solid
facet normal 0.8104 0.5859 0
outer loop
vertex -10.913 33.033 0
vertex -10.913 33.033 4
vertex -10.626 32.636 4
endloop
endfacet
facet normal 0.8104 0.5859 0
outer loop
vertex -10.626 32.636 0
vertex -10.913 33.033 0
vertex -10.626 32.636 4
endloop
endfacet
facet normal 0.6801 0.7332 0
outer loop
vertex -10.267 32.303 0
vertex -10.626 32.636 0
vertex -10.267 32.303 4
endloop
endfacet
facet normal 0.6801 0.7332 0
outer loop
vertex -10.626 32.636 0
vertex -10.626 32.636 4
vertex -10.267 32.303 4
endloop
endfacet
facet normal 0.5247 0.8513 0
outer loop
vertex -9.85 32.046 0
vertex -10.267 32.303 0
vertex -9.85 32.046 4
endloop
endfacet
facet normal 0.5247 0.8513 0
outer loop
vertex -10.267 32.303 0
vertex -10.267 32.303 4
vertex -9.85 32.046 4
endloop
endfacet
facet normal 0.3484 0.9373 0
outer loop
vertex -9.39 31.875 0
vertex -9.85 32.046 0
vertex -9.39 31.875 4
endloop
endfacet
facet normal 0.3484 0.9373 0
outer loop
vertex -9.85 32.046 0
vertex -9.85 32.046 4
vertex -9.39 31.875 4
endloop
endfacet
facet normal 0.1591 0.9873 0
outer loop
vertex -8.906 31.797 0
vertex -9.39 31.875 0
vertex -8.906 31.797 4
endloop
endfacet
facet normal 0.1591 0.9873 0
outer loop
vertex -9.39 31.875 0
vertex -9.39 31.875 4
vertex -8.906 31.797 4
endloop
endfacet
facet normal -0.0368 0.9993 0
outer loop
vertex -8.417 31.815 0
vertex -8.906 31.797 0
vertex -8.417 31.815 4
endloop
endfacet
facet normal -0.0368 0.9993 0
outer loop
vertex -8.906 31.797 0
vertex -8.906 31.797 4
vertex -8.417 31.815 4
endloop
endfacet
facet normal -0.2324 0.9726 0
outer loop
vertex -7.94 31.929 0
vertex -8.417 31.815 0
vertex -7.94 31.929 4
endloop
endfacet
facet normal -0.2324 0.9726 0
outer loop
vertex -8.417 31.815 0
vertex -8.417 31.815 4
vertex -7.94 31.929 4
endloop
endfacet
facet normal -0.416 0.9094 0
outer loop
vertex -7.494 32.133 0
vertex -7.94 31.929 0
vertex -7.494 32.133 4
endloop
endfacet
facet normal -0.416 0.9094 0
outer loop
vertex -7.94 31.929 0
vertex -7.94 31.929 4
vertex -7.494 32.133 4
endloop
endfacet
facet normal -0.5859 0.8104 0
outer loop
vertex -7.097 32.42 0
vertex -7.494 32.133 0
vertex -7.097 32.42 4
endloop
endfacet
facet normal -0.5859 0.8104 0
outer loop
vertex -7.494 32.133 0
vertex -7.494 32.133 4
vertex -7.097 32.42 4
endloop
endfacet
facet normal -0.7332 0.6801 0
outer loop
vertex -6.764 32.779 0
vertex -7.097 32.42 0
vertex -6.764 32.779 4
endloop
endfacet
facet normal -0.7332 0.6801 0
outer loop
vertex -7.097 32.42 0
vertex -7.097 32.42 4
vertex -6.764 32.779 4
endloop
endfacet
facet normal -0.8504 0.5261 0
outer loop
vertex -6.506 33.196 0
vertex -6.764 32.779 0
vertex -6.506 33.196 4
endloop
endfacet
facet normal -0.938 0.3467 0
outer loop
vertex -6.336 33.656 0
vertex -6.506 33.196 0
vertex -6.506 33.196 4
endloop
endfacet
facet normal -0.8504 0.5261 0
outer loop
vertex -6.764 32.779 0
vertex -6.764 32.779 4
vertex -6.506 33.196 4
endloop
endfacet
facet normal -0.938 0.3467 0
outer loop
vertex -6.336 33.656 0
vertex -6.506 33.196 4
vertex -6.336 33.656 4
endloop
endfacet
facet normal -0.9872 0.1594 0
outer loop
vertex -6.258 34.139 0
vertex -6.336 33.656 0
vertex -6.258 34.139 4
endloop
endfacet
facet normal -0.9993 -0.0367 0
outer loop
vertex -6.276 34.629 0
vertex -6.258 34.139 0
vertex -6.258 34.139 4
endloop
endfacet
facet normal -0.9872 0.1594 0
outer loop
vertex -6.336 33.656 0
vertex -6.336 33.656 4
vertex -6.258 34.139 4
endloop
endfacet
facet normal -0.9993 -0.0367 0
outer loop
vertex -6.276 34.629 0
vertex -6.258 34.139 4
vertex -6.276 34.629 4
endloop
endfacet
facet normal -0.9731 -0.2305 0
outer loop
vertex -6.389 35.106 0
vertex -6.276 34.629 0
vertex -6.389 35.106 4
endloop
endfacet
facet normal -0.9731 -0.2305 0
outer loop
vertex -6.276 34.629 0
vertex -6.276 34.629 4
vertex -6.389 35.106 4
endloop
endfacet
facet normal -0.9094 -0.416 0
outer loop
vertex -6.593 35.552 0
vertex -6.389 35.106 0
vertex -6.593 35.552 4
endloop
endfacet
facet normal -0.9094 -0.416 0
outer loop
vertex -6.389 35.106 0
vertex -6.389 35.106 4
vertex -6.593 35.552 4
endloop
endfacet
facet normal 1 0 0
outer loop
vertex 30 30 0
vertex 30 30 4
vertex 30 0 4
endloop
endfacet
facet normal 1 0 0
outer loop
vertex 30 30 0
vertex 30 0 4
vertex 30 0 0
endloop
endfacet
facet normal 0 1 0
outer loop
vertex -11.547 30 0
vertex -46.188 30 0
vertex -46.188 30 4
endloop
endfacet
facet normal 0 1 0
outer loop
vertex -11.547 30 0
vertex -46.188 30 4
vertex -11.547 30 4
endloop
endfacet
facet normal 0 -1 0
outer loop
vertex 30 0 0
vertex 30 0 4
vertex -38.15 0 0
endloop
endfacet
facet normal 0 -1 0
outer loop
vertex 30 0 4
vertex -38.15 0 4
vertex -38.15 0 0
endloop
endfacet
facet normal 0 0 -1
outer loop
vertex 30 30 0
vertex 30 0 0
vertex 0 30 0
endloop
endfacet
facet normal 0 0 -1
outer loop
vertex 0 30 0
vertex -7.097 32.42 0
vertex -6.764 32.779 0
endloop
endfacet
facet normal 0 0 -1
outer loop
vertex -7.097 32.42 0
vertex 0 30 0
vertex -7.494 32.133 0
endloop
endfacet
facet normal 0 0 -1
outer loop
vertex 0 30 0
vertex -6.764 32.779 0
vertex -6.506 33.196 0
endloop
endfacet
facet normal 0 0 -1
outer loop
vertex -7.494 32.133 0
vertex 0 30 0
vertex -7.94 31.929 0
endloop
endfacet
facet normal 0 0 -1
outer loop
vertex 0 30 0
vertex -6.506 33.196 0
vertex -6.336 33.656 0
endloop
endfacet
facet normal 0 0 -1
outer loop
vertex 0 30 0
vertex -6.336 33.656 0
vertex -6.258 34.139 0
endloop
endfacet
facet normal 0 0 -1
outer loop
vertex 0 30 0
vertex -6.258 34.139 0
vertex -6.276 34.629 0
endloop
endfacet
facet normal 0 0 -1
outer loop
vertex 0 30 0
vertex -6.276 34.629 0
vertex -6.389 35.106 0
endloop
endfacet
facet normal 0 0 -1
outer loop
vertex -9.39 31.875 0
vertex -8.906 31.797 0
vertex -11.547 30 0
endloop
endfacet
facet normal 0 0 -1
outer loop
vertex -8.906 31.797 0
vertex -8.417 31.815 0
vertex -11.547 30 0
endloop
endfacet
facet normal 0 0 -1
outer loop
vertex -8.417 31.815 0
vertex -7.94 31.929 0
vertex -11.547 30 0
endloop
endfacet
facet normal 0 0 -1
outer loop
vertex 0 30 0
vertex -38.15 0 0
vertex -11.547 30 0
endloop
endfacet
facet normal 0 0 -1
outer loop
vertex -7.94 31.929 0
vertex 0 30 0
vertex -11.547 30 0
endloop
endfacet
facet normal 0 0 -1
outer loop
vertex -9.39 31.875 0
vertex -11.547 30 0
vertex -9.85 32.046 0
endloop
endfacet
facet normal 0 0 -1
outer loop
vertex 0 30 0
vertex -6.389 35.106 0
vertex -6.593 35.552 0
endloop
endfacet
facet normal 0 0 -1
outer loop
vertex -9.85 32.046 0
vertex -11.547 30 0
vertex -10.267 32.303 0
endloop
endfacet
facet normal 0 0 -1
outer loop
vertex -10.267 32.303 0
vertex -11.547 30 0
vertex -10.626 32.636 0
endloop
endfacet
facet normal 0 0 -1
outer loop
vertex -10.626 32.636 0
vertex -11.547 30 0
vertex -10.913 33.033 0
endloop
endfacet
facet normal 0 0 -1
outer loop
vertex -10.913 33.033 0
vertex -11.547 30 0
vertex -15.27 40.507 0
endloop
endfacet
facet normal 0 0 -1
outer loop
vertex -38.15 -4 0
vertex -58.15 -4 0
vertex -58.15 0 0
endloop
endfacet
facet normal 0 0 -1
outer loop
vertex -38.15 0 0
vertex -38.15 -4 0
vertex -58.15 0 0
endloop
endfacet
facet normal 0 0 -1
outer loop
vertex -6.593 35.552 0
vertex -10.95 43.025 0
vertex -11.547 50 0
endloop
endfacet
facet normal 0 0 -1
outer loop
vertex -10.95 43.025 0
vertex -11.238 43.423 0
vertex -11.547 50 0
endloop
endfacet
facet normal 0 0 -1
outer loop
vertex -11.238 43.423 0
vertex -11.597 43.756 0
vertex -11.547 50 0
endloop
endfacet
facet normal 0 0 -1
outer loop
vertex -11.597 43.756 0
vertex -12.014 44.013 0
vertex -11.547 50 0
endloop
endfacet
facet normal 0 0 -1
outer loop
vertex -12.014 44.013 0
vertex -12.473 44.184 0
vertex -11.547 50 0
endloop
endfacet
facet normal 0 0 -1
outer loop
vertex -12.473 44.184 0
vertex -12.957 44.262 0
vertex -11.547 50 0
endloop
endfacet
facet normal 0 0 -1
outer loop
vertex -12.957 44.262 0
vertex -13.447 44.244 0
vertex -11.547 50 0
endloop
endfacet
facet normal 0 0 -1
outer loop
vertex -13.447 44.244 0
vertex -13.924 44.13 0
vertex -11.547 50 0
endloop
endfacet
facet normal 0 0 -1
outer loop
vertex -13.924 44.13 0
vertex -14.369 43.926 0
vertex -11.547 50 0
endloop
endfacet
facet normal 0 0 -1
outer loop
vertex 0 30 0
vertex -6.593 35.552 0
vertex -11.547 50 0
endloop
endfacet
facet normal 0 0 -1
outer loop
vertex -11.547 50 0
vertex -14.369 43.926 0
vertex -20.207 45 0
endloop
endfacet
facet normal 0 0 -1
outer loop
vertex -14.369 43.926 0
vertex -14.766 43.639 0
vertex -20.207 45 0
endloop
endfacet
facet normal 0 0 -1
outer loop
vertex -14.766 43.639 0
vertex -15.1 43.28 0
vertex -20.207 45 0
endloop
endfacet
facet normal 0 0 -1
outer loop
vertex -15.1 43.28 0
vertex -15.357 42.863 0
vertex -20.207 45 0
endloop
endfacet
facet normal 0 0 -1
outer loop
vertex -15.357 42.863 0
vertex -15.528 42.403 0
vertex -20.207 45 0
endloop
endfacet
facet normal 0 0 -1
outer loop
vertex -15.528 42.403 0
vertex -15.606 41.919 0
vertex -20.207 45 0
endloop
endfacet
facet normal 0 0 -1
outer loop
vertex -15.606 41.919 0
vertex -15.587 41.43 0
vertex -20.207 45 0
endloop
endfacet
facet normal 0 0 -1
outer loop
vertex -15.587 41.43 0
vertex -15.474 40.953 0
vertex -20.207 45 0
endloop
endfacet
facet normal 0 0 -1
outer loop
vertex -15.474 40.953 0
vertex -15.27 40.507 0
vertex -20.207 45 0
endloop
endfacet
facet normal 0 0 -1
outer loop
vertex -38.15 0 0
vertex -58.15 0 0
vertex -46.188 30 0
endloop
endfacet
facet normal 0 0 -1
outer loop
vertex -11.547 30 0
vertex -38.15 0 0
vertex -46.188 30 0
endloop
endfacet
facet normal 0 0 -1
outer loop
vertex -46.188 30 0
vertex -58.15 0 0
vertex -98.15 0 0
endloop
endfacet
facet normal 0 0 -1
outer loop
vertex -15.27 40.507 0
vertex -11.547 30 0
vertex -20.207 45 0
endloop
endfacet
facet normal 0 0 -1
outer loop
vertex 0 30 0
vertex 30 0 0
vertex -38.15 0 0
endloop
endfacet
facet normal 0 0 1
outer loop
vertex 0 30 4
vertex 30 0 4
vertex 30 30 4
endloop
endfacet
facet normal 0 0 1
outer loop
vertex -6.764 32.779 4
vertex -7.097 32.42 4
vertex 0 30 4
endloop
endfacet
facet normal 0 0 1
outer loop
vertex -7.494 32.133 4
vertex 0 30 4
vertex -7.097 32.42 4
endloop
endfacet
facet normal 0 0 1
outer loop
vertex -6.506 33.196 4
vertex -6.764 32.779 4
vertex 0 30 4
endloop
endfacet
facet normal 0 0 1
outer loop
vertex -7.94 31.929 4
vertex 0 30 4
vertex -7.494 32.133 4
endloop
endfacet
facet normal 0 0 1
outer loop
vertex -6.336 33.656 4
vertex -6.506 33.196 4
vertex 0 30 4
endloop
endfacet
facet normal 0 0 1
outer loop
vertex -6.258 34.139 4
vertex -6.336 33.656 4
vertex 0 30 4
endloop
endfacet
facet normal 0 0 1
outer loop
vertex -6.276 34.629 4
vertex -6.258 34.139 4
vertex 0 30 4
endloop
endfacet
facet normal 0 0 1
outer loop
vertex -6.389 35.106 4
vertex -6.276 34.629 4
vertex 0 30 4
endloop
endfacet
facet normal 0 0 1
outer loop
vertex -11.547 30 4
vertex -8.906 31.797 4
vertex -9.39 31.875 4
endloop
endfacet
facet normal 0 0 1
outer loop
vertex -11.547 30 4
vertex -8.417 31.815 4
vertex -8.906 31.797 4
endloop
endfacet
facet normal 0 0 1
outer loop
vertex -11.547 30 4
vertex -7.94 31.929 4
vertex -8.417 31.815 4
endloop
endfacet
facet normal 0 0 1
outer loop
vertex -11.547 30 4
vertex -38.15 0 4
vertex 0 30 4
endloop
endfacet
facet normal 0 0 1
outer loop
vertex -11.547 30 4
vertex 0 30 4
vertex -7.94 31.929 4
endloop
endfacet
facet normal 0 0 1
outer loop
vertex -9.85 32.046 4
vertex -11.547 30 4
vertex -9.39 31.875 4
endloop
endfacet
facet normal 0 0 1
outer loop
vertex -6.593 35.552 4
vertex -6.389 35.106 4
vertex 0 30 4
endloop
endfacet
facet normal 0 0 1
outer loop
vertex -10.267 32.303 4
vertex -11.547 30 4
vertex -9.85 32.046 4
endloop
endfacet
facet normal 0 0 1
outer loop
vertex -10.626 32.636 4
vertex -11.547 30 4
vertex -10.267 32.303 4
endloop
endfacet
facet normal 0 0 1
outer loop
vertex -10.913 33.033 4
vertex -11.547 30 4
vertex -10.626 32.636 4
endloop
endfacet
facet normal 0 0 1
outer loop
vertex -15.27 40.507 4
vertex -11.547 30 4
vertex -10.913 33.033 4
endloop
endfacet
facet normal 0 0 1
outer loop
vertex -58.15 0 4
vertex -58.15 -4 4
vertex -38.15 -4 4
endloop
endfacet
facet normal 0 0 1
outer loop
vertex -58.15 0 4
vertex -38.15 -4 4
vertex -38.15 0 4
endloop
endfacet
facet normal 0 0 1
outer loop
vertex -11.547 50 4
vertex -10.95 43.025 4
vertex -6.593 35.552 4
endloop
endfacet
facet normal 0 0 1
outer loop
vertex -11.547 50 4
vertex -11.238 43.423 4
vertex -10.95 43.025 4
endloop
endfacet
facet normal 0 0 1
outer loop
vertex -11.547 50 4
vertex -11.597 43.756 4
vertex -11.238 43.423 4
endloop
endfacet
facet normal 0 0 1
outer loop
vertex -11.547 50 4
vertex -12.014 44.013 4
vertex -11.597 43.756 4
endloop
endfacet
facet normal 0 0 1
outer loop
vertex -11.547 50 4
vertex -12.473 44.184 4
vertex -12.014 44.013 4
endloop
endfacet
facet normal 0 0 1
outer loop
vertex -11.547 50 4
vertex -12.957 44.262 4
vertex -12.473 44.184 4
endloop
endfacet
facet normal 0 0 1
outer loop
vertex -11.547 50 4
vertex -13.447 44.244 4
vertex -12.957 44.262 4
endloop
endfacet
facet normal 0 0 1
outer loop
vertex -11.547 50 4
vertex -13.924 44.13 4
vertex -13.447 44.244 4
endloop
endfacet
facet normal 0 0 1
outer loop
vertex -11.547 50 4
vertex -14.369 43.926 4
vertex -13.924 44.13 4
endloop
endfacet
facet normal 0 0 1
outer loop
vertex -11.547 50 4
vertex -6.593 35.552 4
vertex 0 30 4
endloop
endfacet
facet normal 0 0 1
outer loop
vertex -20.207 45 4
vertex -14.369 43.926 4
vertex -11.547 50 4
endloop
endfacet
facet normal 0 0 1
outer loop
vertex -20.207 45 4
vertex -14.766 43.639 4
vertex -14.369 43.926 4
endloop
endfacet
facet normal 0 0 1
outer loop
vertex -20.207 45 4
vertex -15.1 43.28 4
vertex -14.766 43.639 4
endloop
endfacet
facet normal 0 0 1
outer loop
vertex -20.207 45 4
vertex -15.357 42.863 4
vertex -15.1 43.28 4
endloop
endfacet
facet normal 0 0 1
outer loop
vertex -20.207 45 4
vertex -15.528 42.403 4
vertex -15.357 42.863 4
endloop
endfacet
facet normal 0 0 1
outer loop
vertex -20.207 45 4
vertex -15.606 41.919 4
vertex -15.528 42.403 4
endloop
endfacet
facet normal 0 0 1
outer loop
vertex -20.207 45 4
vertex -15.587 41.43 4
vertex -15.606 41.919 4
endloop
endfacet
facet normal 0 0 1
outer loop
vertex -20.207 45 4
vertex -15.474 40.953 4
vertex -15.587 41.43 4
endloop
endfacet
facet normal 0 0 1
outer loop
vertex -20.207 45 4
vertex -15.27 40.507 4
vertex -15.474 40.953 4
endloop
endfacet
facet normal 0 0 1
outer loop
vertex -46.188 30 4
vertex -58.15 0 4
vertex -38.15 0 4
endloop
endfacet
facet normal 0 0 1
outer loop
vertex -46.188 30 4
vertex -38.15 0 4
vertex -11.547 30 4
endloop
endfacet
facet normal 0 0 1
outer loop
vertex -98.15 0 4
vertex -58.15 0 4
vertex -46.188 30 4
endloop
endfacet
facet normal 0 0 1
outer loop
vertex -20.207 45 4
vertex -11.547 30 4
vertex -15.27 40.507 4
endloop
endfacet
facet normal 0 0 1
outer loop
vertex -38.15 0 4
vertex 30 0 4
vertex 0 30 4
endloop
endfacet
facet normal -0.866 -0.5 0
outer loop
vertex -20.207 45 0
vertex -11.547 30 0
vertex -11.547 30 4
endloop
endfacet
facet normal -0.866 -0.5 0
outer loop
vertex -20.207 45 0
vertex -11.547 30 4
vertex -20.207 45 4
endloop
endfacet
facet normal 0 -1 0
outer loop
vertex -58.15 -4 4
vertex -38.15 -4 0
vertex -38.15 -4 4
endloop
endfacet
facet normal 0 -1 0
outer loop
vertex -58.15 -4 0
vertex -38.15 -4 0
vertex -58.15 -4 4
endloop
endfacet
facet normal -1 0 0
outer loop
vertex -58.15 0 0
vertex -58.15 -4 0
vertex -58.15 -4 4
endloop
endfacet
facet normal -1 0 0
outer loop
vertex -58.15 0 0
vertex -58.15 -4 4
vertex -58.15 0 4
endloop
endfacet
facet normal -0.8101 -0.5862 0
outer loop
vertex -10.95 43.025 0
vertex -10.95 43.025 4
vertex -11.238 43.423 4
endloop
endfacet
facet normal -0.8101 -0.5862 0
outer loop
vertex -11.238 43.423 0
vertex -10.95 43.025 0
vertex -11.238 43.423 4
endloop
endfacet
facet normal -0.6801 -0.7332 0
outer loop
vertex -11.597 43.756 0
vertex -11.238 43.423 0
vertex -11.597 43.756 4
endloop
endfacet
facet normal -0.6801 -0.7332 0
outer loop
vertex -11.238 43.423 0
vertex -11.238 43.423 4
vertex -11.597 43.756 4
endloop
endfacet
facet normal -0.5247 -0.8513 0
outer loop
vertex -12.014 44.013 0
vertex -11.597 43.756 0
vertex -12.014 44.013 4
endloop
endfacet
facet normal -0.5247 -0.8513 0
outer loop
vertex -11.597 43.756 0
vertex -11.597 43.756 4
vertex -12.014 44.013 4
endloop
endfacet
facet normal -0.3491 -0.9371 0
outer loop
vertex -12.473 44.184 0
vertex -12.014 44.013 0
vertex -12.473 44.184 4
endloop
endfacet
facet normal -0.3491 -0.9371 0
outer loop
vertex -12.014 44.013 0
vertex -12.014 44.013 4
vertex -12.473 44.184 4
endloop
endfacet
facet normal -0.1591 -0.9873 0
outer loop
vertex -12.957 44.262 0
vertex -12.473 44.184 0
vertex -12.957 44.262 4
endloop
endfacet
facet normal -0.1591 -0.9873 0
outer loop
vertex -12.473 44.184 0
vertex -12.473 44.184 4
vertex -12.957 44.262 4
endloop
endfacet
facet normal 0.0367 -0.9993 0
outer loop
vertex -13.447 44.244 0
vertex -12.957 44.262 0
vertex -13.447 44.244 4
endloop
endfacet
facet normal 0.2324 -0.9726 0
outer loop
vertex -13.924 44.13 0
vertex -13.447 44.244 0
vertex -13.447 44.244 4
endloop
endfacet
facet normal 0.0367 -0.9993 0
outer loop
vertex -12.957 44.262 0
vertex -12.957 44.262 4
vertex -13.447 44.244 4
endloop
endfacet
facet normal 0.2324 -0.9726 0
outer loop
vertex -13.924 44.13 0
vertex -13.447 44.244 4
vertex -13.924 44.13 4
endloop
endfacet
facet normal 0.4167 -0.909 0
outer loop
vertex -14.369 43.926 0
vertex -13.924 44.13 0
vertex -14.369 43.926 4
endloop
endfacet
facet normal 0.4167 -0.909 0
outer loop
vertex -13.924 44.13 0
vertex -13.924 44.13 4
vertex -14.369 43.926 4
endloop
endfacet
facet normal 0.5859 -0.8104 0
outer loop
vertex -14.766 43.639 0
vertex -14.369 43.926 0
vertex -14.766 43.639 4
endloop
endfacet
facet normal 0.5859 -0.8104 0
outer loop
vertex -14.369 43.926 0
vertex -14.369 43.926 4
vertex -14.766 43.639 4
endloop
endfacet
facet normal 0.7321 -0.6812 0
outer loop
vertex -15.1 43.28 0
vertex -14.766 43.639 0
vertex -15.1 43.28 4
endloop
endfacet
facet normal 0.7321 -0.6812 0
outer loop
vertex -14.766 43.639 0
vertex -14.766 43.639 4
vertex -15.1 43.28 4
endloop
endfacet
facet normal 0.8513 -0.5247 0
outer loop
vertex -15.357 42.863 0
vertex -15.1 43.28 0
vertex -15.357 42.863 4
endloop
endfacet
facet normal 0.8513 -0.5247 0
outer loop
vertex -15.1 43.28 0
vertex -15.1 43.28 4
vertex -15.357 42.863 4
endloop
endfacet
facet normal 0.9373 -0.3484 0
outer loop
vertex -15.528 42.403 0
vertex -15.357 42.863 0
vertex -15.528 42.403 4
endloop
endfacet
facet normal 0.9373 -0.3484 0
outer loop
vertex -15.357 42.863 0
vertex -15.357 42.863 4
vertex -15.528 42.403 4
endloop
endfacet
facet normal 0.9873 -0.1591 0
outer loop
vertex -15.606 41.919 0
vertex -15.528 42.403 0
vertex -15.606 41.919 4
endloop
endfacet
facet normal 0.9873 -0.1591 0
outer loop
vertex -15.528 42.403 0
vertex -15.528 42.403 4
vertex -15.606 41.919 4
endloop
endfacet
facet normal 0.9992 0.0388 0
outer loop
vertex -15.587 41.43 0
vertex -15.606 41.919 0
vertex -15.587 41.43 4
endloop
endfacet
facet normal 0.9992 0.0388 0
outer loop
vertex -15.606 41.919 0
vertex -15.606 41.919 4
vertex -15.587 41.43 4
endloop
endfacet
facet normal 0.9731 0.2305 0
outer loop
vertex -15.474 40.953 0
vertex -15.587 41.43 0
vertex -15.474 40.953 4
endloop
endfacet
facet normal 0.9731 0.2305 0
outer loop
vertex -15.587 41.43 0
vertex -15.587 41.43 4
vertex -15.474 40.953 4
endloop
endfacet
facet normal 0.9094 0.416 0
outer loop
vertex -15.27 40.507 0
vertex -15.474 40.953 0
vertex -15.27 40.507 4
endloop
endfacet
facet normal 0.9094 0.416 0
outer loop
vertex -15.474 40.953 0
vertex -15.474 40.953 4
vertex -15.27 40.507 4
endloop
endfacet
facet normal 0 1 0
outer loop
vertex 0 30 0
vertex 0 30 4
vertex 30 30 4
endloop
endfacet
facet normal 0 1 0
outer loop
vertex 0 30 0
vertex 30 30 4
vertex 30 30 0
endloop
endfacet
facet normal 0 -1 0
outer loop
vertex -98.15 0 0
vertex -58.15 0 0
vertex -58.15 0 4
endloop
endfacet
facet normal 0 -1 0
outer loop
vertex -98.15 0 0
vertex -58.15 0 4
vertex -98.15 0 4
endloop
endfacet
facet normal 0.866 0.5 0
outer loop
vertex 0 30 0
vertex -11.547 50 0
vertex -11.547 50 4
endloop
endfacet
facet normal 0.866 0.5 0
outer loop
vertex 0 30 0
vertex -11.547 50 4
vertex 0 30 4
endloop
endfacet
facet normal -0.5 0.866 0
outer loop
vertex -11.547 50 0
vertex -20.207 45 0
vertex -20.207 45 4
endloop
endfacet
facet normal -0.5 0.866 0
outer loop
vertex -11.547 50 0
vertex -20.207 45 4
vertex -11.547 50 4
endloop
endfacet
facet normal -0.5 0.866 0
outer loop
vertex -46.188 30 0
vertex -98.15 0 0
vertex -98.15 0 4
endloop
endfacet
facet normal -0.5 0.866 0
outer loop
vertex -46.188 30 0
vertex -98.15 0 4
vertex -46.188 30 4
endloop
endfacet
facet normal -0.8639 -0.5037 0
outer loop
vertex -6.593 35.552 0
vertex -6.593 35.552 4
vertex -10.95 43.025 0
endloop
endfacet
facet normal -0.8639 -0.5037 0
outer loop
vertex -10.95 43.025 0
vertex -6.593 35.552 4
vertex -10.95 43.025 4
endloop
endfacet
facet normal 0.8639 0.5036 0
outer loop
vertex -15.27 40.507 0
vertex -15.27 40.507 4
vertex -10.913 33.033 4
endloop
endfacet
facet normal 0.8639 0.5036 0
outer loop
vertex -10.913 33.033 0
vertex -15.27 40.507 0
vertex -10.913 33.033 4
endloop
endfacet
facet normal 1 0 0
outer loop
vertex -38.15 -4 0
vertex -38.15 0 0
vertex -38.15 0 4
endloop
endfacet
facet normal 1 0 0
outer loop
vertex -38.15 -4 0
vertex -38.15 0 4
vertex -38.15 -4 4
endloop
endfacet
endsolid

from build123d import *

# Parameters (mm, degrees)
BOSS_EXTRUDE1_DEPTH = 4
CUT_EXTRUDE2_DEPTH  = 4
SKETCH5_W           = 4
SKETCH5_H           = 30
BOSS_EXTRUDE2_DEPTH = 30


with BuildPart() as part:
    # Sketch1 → Boss-Extrude1 (new body)
    with BuildSketch(Plane.XY):
        Polygon((0, 0), (-38.149545772, 0), (-38.149545772, -4), (-58.149545772, -4), (-58.149545772, 0), (-98.149545772, 0), (-46.188021545, 30), (-11.547005384, 30), (-20.207259423, 45.000000002), (-11.547005385, 50.000000002), (0, 30), align=None)
    extrude(amount=BOSS_EXTRUDE1_DEPTH)

    # Sketch3 → Cut-Extrude2 (cut)
    with BuildSketch(Plane.XY.offset(4)):
        with BuildLine():
            Line((-6.593479065, 35.551516575), (-10.950440862, 43.025442617))
            ThreePointArc((-10.950440862, 43.025442617), (-14.369311445, 43.926177837), (-15.270046665, 40.507307254))
            Line((-15.270046665, 40.507307254), (-10.913084868, 33.033381213))
            ThreePointArc((-10.913084868, 33.033381213), (-7.494214285, 32.132645993), (-6.593479065, 35.551516575))
        make_face()
    extrude(amount=-CUT_EXTRUDE2_DEPTH, mode=Mode.SUBTRACT)

    # Sketch5 → Boss-Extrude2 (add)
    with BuildSketch(Plane(origin=(0, 0, 0), x_dir=(0, 0, -1), z_dir=(1, 0, 0))):
        with Locations((-2, 15)):
            Rectangle(SKETCH5_W, SKETCH5_H)
    extrude(amount=BOSS_EXTRUDE2_DEPTH)


solid = part.part
